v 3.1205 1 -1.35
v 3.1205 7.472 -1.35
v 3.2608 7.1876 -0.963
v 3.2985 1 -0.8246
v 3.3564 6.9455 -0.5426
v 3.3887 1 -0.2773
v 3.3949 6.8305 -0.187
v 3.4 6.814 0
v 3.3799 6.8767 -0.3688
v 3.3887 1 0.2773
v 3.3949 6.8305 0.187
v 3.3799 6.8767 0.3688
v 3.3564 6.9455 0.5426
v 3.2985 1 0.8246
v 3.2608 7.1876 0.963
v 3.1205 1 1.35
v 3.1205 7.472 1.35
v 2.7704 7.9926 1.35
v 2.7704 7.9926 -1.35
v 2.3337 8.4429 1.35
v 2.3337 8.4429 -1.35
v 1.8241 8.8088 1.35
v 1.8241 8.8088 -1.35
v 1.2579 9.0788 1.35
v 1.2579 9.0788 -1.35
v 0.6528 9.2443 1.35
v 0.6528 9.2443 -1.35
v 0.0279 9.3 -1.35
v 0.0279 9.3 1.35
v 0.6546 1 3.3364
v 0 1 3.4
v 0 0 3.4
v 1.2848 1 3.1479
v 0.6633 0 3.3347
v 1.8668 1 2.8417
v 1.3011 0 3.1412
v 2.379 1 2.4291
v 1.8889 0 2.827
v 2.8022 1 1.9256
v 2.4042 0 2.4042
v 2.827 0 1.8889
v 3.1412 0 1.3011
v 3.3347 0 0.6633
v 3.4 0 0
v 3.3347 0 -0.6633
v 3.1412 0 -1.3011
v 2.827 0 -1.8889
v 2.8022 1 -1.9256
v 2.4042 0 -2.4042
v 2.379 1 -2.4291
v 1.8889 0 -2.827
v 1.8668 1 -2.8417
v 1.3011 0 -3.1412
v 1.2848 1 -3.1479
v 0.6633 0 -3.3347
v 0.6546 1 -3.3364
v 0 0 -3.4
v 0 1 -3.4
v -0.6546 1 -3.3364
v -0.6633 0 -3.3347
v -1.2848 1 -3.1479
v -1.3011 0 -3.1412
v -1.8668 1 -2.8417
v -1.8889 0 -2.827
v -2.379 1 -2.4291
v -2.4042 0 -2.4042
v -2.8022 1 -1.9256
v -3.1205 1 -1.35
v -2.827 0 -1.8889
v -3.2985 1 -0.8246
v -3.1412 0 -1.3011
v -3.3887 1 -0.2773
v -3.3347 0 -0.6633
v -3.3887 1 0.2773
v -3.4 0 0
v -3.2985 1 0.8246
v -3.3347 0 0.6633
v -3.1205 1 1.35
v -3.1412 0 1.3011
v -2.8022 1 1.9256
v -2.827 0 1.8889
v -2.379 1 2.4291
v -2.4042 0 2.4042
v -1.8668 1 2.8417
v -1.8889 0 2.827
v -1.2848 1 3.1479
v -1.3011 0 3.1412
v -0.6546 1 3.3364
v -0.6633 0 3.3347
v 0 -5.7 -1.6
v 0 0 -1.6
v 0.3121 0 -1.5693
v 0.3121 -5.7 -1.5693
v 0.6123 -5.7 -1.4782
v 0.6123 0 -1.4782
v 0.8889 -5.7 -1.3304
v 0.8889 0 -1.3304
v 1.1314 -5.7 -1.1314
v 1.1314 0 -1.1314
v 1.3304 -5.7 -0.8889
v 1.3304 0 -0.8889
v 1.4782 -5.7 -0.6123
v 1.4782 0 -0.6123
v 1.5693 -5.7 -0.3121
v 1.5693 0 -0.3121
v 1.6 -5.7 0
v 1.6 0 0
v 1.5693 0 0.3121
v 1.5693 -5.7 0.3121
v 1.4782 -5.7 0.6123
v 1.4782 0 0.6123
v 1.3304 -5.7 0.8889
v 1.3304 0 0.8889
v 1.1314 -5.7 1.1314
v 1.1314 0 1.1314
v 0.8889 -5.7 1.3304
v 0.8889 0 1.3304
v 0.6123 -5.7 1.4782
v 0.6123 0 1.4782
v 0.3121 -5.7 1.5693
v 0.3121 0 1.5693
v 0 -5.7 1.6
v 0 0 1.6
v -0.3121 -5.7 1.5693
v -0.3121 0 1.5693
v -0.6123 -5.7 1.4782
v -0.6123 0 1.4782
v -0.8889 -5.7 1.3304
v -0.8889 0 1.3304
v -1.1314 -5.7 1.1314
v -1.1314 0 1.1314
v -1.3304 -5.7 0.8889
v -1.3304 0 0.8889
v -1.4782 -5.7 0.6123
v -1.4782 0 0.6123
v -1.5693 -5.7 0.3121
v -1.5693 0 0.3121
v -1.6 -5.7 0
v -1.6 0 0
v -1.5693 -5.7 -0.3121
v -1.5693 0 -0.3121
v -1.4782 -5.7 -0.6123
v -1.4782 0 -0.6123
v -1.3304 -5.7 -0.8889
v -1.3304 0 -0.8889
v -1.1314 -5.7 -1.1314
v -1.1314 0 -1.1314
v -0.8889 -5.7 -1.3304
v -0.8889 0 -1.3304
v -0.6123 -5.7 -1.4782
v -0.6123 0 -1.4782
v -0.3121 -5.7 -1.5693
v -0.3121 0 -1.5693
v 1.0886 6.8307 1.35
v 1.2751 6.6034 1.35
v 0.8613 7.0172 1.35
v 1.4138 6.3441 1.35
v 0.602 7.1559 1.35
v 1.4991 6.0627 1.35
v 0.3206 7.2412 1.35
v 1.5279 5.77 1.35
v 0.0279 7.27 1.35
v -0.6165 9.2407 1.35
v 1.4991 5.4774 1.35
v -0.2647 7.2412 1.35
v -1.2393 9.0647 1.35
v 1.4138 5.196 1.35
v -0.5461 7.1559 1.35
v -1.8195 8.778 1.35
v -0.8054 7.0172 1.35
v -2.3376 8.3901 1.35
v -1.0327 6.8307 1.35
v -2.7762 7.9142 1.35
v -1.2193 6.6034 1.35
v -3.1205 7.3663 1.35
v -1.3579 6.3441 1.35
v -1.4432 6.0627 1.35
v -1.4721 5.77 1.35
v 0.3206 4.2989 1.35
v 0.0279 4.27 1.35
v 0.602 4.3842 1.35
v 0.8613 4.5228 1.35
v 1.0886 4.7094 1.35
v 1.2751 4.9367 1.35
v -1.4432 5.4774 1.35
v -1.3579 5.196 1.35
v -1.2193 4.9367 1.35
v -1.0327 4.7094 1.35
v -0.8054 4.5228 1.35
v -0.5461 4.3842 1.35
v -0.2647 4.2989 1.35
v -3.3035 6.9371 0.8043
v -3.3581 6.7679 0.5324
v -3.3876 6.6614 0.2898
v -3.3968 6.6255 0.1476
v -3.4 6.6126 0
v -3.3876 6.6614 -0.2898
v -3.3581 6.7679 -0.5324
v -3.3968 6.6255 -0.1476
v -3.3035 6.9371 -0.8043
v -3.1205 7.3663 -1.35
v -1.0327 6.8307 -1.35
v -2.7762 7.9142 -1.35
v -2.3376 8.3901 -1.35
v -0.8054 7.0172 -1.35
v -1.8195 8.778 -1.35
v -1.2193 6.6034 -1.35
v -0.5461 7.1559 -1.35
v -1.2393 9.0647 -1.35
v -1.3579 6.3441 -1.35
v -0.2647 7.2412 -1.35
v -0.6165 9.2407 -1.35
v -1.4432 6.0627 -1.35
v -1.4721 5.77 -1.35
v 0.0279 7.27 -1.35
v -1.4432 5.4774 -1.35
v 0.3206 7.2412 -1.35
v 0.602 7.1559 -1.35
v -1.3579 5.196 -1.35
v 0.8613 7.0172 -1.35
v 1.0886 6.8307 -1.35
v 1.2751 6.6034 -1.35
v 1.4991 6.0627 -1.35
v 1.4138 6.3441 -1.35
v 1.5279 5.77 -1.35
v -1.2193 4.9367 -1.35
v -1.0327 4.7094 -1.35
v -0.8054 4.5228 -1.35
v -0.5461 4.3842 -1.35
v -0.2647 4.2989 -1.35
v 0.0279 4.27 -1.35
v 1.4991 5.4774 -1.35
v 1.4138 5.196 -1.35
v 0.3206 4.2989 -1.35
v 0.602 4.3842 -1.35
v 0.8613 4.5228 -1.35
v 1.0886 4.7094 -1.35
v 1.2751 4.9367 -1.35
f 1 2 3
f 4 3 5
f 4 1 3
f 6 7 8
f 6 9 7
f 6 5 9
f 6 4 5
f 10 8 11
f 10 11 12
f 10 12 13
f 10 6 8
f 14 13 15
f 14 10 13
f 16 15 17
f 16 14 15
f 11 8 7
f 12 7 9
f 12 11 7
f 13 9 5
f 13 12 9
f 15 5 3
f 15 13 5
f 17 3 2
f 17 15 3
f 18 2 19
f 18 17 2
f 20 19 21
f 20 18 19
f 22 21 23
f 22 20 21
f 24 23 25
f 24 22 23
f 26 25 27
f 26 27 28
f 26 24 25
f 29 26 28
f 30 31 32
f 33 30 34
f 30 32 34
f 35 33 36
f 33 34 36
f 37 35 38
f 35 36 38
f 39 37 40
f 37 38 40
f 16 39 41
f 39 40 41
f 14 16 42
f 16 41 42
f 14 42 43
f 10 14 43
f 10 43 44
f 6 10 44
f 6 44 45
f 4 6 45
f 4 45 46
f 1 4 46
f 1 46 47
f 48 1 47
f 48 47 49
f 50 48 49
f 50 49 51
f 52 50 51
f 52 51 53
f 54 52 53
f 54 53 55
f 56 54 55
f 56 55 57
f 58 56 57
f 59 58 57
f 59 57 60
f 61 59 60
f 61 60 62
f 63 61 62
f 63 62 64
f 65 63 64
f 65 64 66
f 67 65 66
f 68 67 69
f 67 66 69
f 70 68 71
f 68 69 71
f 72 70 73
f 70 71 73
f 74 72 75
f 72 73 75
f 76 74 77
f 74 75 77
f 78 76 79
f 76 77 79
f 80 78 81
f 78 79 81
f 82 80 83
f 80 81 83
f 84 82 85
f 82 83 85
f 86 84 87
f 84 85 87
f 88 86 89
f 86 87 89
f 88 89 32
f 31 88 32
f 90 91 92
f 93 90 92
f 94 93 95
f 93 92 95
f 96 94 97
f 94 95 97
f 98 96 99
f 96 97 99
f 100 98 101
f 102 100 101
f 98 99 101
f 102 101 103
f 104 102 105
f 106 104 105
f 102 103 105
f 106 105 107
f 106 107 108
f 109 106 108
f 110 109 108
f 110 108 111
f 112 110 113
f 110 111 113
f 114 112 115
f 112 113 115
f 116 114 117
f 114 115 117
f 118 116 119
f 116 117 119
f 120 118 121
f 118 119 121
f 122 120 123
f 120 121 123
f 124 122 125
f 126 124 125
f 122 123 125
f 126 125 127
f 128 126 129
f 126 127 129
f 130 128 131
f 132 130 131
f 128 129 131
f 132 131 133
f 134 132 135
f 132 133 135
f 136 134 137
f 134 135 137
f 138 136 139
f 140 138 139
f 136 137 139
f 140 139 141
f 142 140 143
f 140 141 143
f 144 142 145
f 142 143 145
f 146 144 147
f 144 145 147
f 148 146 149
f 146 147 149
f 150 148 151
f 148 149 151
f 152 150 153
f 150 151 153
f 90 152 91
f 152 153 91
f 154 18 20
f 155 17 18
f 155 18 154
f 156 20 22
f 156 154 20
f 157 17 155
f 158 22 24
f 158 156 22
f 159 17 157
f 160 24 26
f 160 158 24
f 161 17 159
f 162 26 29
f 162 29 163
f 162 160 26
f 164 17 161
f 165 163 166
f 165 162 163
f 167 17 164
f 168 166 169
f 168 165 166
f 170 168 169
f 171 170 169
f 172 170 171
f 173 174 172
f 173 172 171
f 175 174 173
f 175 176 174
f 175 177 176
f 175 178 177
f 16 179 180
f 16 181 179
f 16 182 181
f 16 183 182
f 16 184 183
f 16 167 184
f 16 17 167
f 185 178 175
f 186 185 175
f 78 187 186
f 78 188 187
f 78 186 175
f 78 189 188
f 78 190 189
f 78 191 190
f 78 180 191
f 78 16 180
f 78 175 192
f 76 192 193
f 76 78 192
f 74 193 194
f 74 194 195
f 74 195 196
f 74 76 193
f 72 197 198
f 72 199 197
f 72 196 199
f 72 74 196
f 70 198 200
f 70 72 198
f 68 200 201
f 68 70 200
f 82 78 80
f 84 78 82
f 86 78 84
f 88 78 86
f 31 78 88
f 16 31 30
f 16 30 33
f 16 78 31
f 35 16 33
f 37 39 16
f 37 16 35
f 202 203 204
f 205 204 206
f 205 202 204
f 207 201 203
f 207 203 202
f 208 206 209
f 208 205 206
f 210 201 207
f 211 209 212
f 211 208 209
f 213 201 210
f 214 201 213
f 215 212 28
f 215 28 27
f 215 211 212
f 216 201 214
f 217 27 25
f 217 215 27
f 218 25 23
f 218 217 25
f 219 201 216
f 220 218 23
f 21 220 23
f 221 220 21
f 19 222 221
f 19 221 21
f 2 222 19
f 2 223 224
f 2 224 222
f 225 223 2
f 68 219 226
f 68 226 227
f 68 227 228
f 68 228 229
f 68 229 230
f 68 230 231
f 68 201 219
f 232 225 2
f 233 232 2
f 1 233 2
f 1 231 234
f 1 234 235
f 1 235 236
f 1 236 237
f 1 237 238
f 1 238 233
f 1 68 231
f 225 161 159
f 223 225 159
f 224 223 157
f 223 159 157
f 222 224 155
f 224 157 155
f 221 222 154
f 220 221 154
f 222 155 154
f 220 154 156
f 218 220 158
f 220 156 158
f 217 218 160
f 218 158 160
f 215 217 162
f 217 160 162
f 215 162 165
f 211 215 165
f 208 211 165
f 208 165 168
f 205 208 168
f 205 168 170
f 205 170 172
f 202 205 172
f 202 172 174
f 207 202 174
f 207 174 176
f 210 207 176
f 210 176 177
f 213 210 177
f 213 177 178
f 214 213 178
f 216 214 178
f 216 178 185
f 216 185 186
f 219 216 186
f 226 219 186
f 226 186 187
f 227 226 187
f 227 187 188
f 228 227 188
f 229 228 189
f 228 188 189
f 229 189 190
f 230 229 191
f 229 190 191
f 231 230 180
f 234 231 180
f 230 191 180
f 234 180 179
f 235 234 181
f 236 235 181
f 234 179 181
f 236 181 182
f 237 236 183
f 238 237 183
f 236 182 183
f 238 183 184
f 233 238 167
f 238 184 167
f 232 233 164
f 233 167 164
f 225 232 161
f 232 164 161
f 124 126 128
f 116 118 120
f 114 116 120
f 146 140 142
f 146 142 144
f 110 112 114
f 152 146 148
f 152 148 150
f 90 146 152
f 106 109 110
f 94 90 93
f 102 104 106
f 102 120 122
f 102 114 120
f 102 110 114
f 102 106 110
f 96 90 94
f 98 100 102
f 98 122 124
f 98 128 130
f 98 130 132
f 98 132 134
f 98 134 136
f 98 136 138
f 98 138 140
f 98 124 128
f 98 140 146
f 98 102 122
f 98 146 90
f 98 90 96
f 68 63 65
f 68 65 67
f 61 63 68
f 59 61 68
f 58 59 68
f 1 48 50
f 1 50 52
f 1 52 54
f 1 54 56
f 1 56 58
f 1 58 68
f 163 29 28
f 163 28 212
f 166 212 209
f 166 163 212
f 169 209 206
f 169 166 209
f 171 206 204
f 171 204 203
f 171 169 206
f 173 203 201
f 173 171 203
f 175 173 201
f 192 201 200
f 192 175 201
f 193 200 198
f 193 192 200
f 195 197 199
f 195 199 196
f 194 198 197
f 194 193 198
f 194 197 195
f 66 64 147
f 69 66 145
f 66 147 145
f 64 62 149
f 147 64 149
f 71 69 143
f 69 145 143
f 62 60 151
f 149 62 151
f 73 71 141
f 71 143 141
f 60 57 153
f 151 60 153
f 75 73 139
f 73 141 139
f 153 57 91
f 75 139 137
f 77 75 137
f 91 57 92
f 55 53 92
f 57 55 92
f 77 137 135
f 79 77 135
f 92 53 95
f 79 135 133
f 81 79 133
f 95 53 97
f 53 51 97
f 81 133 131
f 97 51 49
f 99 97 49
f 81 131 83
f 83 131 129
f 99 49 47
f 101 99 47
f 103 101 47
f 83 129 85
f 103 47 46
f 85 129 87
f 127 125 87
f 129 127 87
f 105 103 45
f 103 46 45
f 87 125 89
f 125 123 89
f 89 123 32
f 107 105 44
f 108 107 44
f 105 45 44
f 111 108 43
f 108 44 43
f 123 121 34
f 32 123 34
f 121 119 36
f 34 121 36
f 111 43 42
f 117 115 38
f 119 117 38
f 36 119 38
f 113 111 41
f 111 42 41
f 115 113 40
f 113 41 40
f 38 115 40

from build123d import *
from build123d.topology import SkipClean

# Parameters (mm, degrees)
SKETCH_1_R          = 3.4
EXTRUDE_3_DEPTH     = 1
EXTRUDE_4_DEPTH     = 8.3
CUT_EXTRUDE_3_DEPTH = 11.982372239
SKETCH_7_R          = 1.5
CUT_EXTRUDE_4_DEPTH = 11.982372355
SKETCH_8_R          = 1.6
EXTRUDE_5_DEPTH     = 5.7


with BuildPart() as part:
    # 草图1 → 凸台-拉伸3 (new body)
    with BuildSketch(Plane(origin=(0, 0, 0), x_dir=(1, 0, 0), z_dir=(0, 1, 0))):
        with Locations(Location((0, 0, 0), (0, 0, 270))):
            Circle(SKETCH_1_R)
    extrude(amount=EXTRUDE_3_DEPTH)

    # 草图5 → 凸台-拉伸4 (add)
    with SkipClean():  # the faces are left unmerged after this step: merging them gives an invalid solid
        with BuildSketch(Plane(origin=(0, 1, 0), x_dir=(1, 0, 0), z_dir=(0, 1, 0))):
            with BuildLine():
                Line((-3.120496755, 1.35), (3.120496755, 1.35))
                ThreePointArc((3.120496755, 1.35), (3.4, 0), (3.120496755, -1.35))
                Line((3.120496755, -1.35), (-3.120496755, -1.35))
                ThreePointArc((-3.120496755, -1.35), (-3.4, 0), (-3.120496755, 1.35))
            make_face()
        extrude(amount=EXTRUDE_4_DEPTH)

    # 草图6 → 切除-拉伸3 (cut, through all)
    with SkipClean():  # the faces are left unmerged after this step: merging them gives an invalid solid
        with BuildSketch(Plane.XY.offset(1.35)):
            with BuildLine():
                Line((-3.4, 6.612575767), (-3.4, 9.766288837))
                Line((-3.4, 9.766288837), (3.4, 9.766288837))
                Line((3.4, 9.766288837), (3.4, 6.81399223))
                ThreePointArc((3.4, 6.81399223), (-0.076572867, 9.298452515), (-3.4, 6.612575767))
            make_face()
        extrude(amount=-CUT_EXTRUDE_3_DEPTH, mode=Mode.SUBTRACT)

    # 草图7 → 切除-拉伸4 (cut, through all)
    with SkipClean():  # the faces are left unmerged after this step: merging them gives an invalid solid
        with BuildSketch(Plane.XY.offset(1.35)):
            with Locations((0.027939034, 5.770037221)):
                Circle(SKETCH_7_R)
        extrude(amount=-CUT_EXTRUDE_4_DEPTH, mode=Mode.SUBTRACT)

    # 草图8 → 凸台-拉伸5 (add)
    with SkipClean():  # the faces are left unmerged after this step: merging them gives an invalid solid
        with BuildSketch(Plane.XZ):
            with Locations(Location((0, 0, 0), (0, 0, 270))):
                Circle(SKETCH_8_R)
        extrude(amount=EXTRUDE_5_DEPTH)


solid = part.part
